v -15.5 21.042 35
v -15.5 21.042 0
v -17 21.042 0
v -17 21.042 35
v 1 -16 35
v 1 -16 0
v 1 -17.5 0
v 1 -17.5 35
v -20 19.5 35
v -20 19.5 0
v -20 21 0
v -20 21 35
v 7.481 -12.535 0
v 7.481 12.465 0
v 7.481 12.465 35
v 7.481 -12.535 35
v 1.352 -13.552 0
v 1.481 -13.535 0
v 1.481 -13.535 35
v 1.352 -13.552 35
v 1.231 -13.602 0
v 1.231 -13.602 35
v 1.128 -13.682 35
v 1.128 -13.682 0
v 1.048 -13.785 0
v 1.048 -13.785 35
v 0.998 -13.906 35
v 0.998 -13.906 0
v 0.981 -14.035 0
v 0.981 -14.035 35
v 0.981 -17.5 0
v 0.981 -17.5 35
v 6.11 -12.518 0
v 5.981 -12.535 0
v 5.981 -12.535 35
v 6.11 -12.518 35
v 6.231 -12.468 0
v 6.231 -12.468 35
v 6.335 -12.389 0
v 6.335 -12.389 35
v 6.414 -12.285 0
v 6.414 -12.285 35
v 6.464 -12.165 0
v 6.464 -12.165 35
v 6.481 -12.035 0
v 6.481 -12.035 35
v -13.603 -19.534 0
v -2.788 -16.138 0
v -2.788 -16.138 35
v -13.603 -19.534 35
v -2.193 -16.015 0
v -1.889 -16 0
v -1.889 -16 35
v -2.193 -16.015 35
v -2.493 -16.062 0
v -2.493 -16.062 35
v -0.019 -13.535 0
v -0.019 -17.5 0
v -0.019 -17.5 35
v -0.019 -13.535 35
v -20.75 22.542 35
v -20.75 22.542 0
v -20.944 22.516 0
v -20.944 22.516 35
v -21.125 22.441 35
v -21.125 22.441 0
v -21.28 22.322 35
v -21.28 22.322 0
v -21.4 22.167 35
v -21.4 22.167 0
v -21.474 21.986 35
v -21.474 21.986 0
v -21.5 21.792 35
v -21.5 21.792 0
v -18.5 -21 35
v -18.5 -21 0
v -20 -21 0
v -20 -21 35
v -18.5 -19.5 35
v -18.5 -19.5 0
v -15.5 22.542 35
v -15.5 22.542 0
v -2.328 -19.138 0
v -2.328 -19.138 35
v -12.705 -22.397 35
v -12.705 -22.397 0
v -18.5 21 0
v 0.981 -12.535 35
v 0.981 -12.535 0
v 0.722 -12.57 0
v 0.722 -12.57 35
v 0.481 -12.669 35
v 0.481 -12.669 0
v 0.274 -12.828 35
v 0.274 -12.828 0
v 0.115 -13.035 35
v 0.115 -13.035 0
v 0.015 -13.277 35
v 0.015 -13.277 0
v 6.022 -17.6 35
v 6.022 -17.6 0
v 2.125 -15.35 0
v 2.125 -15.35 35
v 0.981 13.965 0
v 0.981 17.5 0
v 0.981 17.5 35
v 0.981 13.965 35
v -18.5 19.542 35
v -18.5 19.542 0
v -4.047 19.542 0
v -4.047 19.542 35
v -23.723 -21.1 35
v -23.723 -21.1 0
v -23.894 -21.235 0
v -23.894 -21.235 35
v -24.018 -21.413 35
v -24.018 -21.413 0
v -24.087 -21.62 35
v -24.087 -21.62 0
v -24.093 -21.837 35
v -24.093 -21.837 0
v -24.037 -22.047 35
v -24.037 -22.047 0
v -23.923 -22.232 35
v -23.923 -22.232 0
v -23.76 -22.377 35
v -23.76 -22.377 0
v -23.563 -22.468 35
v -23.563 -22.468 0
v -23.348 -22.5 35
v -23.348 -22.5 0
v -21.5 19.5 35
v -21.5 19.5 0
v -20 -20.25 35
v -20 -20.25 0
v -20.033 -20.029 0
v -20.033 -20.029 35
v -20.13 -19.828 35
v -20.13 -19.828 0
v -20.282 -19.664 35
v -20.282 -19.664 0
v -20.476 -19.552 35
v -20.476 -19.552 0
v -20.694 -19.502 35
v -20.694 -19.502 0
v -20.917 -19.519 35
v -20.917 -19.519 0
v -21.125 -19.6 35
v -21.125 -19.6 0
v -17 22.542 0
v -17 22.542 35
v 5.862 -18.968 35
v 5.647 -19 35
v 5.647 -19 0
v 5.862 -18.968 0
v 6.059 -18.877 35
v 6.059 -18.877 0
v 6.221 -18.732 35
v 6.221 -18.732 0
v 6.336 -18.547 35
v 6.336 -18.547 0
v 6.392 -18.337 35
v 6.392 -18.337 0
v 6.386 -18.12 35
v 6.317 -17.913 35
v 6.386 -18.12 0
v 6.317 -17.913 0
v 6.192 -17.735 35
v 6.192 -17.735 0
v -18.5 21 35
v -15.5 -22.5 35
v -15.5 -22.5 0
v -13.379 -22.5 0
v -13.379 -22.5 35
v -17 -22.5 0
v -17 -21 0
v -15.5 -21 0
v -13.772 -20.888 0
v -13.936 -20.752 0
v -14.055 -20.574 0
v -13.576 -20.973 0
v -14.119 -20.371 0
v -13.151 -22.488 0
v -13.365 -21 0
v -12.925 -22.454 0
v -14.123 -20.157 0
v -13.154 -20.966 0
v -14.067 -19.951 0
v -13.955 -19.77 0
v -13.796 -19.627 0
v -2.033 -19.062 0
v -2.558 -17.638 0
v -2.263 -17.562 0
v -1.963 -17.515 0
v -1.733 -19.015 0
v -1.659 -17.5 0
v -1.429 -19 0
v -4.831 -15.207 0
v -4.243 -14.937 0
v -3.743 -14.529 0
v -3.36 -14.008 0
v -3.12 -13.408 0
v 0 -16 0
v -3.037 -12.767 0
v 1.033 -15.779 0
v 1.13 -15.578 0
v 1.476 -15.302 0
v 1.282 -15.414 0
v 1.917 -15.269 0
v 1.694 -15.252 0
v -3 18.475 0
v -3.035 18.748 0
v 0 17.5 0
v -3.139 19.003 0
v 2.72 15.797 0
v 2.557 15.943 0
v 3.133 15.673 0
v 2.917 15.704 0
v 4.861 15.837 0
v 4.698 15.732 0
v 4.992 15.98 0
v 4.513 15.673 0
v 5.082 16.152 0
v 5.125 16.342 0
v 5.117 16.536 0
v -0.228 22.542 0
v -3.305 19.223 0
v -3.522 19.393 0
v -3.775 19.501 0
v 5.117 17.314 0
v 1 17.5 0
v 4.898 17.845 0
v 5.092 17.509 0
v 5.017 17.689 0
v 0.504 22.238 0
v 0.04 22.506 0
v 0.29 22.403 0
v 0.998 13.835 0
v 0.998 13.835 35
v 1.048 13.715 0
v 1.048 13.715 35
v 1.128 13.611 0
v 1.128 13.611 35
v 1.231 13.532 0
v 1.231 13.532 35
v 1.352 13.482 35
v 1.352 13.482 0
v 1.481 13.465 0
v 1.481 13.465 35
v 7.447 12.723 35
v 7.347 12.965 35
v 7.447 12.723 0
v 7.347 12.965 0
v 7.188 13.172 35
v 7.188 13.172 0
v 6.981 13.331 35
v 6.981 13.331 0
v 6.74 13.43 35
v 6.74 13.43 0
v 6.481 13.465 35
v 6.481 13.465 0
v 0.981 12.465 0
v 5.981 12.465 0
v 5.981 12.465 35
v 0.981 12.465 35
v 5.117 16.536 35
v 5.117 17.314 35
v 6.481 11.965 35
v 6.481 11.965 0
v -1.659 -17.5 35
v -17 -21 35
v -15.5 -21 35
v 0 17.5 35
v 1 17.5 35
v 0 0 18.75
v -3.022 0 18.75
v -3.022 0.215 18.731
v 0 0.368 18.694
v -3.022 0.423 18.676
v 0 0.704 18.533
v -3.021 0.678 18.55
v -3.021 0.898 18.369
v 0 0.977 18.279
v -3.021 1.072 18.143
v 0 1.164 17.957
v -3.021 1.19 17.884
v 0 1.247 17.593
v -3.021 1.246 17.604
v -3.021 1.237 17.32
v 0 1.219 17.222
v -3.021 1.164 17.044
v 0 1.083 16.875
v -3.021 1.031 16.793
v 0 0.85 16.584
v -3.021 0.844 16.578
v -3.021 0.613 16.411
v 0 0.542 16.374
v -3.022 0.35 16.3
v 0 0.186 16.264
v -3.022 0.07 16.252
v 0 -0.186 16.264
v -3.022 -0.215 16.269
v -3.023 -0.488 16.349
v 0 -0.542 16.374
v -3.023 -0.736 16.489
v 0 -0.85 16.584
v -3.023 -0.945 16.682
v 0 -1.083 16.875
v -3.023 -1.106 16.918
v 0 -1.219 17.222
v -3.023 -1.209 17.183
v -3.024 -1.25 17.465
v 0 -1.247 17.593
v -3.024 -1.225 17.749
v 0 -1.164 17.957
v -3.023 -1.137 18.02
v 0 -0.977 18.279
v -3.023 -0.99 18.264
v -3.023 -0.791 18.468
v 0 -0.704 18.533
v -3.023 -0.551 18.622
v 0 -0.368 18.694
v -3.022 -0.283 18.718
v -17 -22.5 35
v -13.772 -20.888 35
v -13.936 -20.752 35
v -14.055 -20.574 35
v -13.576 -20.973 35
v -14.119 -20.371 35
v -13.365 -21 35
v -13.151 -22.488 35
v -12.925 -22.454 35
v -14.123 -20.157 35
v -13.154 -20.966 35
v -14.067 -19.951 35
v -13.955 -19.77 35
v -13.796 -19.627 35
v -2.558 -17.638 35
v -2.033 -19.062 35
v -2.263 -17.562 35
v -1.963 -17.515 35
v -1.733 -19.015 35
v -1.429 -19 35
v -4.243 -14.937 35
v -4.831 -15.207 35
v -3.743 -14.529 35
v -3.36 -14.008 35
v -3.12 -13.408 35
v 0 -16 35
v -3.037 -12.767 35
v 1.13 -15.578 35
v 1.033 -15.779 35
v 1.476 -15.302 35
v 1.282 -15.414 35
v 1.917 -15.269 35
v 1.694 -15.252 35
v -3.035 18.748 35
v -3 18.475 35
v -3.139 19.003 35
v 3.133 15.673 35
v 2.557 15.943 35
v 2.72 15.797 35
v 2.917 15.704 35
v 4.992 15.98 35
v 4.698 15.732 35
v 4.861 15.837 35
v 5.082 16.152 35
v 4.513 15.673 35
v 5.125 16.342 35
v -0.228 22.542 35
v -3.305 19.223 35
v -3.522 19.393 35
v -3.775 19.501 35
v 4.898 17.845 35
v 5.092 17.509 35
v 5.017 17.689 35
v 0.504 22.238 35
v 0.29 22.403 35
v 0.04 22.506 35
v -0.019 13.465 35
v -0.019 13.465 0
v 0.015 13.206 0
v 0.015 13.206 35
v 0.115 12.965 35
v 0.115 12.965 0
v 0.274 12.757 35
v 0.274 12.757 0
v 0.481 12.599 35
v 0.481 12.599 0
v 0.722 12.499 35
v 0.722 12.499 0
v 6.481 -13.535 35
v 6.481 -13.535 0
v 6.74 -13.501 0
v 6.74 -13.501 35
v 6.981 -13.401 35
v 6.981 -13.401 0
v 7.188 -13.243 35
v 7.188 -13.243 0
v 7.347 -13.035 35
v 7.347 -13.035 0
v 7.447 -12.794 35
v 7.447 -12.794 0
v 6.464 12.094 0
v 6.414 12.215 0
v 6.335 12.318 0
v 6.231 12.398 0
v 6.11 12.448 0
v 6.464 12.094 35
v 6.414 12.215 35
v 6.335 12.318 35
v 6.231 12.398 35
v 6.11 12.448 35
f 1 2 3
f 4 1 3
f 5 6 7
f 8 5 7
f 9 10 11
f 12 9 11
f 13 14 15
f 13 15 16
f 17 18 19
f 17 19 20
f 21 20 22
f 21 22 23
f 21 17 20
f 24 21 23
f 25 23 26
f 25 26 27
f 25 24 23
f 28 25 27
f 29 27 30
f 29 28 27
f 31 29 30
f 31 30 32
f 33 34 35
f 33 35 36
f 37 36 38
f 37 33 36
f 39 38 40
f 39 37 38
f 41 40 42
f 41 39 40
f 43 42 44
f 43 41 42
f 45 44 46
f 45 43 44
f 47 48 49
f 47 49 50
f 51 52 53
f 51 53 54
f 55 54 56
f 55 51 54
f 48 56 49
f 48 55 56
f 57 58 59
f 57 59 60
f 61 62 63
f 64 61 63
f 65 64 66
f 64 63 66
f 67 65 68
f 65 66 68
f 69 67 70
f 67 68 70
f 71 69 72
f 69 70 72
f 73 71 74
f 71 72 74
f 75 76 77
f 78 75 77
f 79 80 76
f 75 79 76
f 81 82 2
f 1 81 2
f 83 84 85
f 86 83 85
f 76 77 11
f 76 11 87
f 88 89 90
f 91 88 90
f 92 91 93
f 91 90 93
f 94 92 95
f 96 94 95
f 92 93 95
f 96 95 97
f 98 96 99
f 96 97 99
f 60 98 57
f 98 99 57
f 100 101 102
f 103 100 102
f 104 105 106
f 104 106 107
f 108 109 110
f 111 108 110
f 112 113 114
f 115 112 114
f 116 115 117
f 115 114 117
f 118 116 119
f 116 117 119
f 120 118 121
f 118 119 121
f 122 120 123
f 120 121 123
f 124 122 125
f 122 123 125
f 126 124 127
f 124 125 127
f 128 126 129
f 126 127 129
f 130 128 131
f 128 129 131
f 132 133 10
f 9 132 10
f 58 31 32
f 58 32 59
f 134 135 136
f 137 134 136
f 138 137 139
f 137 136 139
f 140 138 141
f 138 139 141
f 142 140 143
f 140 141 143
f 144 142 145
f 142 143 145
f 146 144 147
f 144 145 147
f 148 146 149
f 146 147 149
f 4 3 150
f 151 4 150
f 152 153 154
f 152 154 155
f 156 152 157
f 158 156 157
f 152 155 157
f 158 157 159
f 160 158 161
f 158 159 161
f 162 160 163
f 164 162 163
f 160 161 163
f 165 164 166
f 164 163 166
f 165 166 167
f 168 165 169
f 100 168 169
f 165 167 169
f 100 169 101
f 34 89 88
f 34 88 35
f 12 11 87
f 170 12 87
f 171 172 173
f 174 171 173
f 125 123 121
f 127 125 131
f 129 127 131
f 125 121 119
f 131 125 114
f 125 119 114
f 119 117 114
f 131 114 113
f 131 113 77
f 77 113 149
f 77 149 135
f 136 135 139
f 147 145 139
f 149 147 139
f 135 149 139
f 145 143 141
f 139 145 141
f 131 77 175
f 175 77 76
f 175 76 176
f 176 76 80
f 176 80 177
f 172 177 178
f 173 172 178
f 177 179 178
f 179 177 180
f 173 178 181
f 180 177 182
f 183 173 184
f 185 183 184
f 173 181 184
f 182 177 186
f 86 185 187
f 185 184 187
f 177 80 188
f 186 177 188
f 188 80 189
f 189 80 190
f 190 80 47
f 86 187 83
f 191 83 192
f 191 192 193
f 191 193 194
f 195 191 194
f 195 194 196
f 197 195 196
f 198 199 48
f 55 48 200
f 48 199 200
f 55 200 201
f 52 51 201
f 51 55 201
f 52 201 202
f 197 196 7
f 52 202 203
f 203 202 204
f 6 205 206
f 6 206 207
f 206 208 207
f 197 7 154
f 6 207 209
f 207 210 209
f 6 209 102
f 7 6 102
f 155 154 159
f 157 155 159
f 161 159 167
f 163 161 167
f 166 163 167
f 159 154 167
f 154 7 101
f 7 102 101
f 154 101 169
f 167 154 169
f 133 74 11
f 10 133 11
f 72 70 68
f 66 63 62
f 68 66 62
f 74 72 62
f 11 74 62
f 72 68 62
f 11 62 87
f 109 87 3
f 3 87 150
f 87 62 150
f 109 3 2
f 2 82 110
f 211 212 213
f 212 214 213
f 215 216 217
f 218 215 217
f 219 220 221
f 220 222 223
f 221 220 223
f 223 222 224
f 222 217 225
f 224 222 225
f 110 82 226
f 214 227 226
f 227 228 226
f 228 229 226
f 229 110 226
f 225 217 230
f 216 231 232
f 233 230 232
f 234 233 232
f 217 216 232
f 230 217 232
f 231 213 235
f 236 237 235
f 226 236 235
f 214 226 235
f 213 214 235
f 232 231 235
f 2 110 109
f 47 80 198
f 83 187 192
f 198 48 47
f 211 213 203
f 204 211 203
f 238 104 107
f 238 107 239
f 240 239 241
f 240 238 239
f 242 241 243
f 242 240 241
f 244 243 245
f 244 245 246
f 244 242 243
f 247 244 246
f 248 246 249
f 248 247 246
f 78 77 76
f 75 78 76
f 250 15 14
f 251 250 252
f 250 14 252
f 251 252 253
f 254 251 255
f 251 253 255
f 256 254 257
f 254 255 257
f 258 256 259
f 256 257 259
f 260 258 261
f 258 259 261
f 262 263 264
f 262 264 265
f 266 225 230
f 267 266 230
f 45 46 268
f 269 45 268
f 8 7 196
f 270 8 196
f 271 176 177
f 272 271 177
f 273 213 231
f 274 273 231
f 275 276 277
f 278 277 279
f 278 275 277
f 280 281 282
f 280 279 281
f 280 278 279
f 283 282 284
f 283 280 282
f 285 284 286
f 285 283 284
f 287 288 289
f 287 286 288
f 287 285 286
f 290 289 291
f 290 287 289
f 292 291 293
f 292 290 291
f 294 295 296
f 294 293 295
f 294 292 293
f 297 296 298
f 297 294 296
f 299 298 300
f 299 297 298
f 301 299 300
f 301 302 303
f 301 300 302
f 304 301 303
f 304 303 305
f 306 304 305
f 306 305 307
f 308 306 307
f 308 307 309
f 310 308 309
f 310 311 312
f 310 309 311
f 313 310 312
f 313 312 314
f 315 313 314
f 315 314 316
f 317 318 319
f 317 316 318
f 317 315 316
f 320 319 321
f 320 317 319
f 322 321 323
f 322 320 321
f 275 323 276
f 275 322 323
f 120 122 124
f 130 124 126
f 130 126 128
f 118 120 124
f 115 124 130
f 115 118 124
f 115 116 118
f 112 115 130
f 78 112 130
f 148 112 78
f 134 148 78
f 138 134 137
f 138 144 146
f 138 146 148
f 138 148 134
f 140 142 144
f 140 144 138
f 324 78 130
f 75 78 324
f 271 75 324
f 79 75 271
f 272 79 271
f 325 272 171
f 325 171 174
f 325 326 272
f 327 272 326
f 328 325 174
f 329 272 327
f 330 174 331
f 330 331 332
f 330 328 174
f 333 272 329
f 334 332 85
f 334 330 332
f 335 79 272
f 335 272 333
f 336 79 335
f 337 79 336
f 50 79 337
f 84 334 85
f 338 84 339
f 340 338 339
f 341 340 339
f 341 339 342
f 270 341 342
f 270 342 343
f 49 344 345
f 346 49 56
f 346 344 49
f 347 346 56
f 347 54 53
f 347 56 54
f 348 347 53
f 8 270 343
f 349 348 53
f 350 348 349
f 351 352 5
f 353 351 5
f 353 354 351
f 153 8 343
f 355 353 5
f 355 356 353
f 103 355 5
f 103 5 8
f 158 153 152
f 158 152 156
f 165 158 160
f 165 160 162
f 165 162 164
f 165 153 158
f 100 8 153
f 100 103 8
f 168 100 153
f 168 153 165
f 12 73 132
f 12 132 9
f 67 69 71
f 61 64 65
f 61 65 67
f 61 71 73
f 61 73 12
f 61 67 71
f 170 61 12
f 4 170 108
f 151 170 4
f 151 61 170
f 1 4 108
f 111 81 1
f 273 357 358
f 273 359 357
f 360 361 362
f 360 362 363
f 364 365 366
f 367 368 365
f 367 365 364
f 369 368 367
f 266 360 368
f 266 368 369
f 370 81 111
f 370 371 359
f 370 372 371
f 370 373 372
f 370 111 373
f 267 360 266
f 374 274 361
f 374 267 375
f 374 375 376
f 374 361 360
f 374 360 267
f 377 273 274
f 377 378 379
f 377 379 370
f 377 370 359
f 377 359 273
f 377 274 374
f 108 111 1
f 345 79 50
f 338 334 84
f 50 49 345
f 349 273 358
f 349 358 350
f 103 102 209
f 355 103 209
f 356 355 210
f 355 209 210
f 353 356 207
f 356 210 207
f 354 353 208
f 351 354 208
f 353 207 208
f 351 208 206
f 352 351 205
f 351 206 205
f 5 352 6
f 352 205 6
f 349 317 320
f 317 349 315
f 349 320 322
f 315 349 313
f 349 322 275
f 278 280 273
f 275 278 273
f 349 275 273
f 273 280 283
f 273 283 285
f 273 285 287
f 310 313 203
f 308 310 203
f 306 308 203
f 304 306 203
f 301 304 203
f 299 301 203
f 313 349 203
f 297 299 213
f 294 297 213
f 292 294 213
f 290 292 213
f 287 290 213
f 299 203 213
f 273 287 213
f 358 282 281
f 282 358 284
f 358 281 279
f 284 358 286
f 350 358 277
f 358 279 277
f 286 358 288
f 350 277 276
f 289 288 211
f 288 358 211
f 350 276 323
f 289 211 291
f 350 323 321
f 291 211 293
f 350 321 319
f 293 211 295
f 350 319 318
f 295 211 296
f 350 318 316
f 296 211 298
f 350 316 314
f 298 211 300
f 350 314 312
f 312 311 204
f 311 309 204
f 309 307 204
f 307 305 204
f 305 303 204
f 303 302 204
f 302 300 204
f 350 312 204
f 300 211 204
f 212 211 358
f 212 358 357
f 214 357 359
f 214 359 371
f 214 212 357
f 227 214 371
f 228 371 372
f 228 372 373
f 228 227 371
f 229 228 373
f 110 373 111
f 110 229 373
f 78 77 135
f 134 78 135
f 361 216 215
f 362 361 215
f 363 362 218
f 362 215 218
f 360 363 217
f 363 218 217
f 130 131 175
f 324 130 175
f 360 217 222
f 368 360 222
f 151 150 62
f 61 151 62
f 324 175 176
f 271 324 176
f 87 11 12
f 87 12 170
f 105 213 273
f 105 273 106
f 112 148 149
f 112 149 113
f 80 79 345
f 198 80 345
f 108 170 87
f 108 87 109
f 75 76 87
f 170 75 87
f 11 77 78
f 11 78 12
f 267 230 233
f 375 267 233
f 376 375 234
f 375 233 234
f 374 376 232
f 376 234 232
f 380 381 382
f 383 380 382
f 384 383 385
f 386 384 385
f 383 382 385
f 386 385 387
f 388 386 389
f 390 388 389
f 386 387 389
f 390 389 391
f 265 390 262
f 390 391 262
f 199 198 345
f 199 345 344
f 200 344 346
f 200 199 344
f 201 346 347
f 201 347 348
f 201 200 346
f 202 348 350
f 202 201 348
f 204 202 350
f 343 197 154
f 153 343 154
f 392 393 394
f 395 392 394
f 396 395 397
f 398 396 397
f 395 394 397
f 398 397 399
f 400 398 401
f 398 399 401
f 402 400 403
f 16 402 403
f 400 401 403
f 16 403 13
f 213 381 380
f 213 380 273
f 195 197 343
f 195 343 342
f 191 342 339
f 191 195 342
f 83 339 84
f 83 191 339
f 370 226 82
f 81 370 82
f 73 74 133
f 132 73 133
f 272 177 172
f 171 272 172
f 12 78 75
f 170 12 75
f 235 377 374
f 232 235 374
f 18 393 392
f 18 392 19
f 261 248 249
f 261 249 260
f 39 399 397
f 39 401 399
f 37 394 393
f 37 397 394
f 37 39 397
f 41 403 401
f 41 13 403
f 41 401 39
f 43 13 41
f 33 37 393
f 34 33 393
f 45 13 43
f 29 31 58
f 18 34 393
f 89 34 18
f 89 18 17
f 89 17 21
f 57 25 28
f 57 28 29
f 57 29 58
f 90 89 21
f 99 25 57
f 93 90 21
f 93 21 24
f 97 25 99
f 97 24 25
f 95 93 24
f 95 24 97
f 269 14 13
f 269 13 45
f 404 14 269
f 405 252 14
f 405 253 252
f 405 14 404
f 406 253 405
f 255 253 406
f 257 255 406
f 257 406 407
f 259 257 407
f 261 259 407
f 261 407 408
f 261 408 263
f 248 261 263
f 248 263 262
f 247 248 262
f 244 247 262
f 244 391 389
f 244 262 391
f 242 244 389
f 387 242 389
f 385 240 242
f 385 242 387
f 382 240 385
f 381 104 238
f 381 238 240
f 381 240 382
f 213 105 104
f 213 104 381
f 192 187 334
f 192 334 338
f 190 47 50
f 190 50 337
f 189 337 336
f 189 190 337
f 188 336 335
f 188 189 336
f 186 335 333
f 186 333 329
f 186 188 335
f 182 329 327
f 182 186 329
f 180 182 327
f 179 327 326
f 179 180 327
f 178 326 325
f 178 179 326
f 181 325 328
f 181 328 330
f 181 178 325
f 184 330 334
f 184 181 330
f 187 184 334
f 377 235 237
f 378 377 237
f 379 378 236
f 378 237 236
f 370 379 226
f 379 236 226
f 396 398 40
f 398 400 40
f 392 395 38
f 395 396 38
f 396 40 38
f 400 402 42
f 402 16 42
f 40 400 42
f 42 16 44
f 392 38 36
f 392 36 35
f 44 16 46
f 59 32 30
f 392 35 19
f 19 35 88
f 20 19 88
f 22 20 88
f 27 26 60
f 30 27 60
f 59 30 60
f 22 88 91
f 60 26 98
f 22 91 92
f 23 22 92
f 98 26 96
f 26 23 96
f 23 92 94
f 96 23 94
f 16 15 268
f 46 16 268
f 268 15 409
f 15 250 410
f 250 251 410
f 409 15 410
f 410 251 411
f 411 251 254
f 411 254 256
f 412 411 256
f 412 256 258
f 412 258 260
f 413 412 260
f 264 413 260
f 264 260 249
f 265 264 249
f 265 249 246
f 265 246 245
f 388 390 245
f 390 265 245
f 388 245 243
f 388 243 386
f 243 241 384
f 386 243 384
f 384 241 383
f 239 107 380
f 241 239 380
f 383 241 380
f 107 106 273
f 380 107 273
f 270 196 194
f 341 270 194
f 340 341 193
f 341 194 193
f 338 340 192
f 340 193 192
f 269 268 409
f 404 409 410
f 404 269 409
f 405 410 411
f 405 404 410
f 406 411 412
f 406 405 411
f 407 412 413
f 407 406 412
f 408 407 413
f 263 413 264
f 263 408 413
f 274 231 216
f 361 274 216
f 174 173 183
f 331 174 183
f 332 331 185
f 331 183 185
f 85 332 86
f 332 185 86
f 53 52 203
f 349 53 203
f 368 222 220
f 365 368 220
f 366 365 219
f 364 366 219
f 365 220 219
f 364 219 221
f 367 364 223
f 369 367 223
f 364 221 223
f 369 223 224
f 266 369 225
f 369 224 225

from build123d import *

# Parameters (mm, degrees)
PAD001_DEPTH         = 35
BOX_W                = 1.5
BOX_H                = 42
BOX_DEPTH            = 35
CYLINDER_R           = 1.25
CYLINDER_DEPTH       = 10
CYLINDER_PITCH_ANGLE = -90
PAD_DEPTH            = 35


with BuildPart() as din_rail:
    # Sketch001 → Pad001 (new body)
    with BuildSketch(Plane(origin=(0, 17.5, 0), x_dir=(1, 0, 0), z_dir=(0, 0, 1))):
        with BuildLine():
            Line((0, 0), (0.981065, 0))
            Line((0.981065, 0), (0.981065, -3.535445))
            ThreePointArc((0.981065, -3.535445), (1.127512, -3.888998), (1.481065, -4.035445))
            Line((1.481065, -4.035445), (6.481065, -4.035445))
            ThreePointArc((7.481065, -5.035445), (7.188172, -4.328338), (6.481065, -4.035445))
            Line((7.481065, -5.035445), (7.481065, -30.035445))
            ThreePointArc((6.481065, -31.035445), (7.188172, -30.742552), (7.481065, -30.035445))
            Line((6.481065, -31.035445), (1.481065, -31.035445))
            ThreePointArc((1.481065, -31.035445), (1.127512, -31.181892), (0.981065, -31.535445))
            Line((0.981065, -31.535445), (0.981065, -35))
            Line((0.981065, -35), (-0.018935, -35))
            Line((-0.018935, -35), (-0.018935, -31.035445))
            ThreePointArc((0.981065, -30.035445), (0.273958, -30.328338), (-0.018935, -31.035445))
            Line((0.981065, -30.035445), (5.981065, -30.035445))
            ThreePointArc((5.981065, -30.035445), (6.334618, -29.888998), (6.481065, -29.535445))
            Line((6.481065, -29.535445), (6.481065, -5.535445))
            ThreePointArc((6.481065, -5.535445), (6.334618, -5.181892), (5.981065, -5.035445))
            Line((5.981065, -5.035445), (0.981065, -5.035445))
            ThreePointArc((-0.018935, -4.035445), (0.273958, -4.742552), (0.981065, -5.035445))
            Line((-0.018935, -4.035445), (0, 0))
        make_face()
    extrude(amount=PAD001_DEPTH)


with BuildPart() as pcb:
    # Box → Box (new body)
    with BuildSketch(Plane(origin=(-20, -21, 0), x_dir=(1, 0, 0), z_dir=(0, 0, 1))):
        with Locations((0.75, 21)):
            Rectangle(BOX_W, BOX_H)
    extrude(amount=BOX_DEPTH)


with BuildPart() as bracket_hole:
    # Cylinder → Cylinder (new body)
    with BuildSketch(Plane.XY):
        Circle(CYLINDER_R)
    extrude(amount=CYLINDER_DEPTH)


with BuildPart() as bracket_hole_1:
    # Cylinder pitch: moved
    add(bracket_hole.part.rotate(Axis((0, 0, 0), (0, 1, 0)), CYLINDER_PITCH_ANGLE))


with BuildPart() as bracket_hole_2:
    # Cylinder placement: moved
    add(bracket_hole_1.part.moved(Location((5, 0, 17.5))))


with BuildPart() as din_bracket:
    # Sketch → Pad (new body)
    with BuildSketch(Plane(origin=(-3, 0, 0), x_dir=(1, 0, 0), z_dir=(0, 0, 1))):
        with BuildLine():
            Line((2.771987, 22.541663), (-12.5, 22.541663))
            Line((-12.5, 22.541663), (-12.5, 21.041663))
            Line((-12.5, 21.041663), (-14, 21.041663))
            Line((-14, 21.041663), (-14, 22.541663))
            Line((-14, 22.541663), (-17.75, 22.541663))
            ThreePointArc((-17.75, 22.541663), (-18.28033, 22.321993), (-18.5, 21.791663))
            Line((-18.5, 21.791663), (-18.5, 19.5))
            Line((-18.5, 19.5), (-17, 19.5))
            Line((-17, 19.5), (-17, 21))
            Line((-17, 21), (-15.5, 21))
            Line((-15.5, 21), (-15.5, 19.541663))
            Line((-15.5, 19.541663), (-1.047056, 19.541663))
            ThreePointArc((0, 18.474809), (-0.305125, 19.222587), (-1.047056, 19.541663))
            Line((0, 18.474809), (-0.037298, -12.767241))
            ThreePointArc((-1.830702, -15.207168), (-0.534684, -14.280711), (-0.037298, -12.767241))
            Line((-15.5, -19.5), (-1.830702, -15.207168))
            Line((-15.5, -19.5), (-15.5, -21))
            Line((-15.5, -21), (-17, -21))
            Line((-17, -21), (-17, -20.25))
            ThreePointArc((-17, -20.25), (-17.375, -19.600481), (-18.125, -19.600481))
            Line((-18.125, -19.600481), (-20.723075, -21.100481))
            ThreePointArc((-20.723075, -21.100481), (-21.072519, -21.944114), (-20.348075, -22.5))
            Line((-20.348075, -22.5), (-14, -22.5))
            Line((-14, -22.5), (-14, -21))
            Line((-14, -21), (-12.5, -21))
            Line((-12.5, -21), (-12.5, -22.5))
            Line((-12.5, -22.5), (-10.37868, -22.5))
            ThreePointArc((-10.37868, -22.5), (-10.037666, -22.474008), (-9.704532, -22.396631))
            Line((0.672204, -19.137825), (-9.704532, -22.396631))
            ThreePointArc((1.571068, -19), (1.116383, -19.034657), (0.672204, -19.137825))
            Line((1.571068, -19), (8.646899, -19))
            ThreePointArc((8.646899, -19), (9.371343, -18.444114), (9.021899, -17.600481))
            Line((9.021899, -17.600481), (5.124786, -15.350481))
            ThreePointArc((5.124786, -15.350481), (4.374786, -15.350481), (3.999786, -16))
            Line((3.999786, -16), (3.999786, -17.5))
            Line((3.999786, -17.5), (1.341069, -17.5))
            ThreePointArc((1.341069, -17.5), (0.886384, -17.534657), (0.442205, -17.637825))
            Line((-10.153969, -20.965545), (0.442205, -17.637825))
            ThreePointArc((-10.6034, -19.534458), (-11.094223, -20.474716), (-10.153969, -20.965545))
            Line((0.212206, -16.137825), (-10.6034, -19.534458))
            ThreePointArc((1.111069, -16), (0.656385, -16.034657), (0.212206, -16.137825))
            Line((1.111069, -16), (2.999786, -16))
            Line((2.999786, -16), (2.999786, 17.5))
            Line((2.999786, 17.5), (3.999786, 17.5))
            Line((3.999786, 17.5), (5.556936, 15.942849))
            ThreePointArc((5.556936, 15.942849), (5.815061, 15.743569), (6.133362, 15.672675))
            Line((6.133362, 15.672675), (7.513396, 15.672675))
            ThreePointArc((7.513396, 15.672675), (7.992308, 15.980285), (8.11731, 16.535582))
            Line((8.11731, 16.535582), (8.11731, 17.314455))
            ThreePointArc((8.11731, 17.314455), (8.06022, 17.601467), (7.897641, 17.844785))
            Line((3.50396, 22.23847), (7.897641, 17.844785))
            ThreePointArc((3.50396, 22.23847), (3.168128, 22.462866), (2.771987, 22.541663))
        make_face()
    extrude(amount=PAD_DEPTH)

    # Cut: cut bracket hole
    add(bracket_hole_2.part, mode=Mode.SUBTRACT)


solid = Compound([din_rail.part, pcb.part, din_bracket.part])
